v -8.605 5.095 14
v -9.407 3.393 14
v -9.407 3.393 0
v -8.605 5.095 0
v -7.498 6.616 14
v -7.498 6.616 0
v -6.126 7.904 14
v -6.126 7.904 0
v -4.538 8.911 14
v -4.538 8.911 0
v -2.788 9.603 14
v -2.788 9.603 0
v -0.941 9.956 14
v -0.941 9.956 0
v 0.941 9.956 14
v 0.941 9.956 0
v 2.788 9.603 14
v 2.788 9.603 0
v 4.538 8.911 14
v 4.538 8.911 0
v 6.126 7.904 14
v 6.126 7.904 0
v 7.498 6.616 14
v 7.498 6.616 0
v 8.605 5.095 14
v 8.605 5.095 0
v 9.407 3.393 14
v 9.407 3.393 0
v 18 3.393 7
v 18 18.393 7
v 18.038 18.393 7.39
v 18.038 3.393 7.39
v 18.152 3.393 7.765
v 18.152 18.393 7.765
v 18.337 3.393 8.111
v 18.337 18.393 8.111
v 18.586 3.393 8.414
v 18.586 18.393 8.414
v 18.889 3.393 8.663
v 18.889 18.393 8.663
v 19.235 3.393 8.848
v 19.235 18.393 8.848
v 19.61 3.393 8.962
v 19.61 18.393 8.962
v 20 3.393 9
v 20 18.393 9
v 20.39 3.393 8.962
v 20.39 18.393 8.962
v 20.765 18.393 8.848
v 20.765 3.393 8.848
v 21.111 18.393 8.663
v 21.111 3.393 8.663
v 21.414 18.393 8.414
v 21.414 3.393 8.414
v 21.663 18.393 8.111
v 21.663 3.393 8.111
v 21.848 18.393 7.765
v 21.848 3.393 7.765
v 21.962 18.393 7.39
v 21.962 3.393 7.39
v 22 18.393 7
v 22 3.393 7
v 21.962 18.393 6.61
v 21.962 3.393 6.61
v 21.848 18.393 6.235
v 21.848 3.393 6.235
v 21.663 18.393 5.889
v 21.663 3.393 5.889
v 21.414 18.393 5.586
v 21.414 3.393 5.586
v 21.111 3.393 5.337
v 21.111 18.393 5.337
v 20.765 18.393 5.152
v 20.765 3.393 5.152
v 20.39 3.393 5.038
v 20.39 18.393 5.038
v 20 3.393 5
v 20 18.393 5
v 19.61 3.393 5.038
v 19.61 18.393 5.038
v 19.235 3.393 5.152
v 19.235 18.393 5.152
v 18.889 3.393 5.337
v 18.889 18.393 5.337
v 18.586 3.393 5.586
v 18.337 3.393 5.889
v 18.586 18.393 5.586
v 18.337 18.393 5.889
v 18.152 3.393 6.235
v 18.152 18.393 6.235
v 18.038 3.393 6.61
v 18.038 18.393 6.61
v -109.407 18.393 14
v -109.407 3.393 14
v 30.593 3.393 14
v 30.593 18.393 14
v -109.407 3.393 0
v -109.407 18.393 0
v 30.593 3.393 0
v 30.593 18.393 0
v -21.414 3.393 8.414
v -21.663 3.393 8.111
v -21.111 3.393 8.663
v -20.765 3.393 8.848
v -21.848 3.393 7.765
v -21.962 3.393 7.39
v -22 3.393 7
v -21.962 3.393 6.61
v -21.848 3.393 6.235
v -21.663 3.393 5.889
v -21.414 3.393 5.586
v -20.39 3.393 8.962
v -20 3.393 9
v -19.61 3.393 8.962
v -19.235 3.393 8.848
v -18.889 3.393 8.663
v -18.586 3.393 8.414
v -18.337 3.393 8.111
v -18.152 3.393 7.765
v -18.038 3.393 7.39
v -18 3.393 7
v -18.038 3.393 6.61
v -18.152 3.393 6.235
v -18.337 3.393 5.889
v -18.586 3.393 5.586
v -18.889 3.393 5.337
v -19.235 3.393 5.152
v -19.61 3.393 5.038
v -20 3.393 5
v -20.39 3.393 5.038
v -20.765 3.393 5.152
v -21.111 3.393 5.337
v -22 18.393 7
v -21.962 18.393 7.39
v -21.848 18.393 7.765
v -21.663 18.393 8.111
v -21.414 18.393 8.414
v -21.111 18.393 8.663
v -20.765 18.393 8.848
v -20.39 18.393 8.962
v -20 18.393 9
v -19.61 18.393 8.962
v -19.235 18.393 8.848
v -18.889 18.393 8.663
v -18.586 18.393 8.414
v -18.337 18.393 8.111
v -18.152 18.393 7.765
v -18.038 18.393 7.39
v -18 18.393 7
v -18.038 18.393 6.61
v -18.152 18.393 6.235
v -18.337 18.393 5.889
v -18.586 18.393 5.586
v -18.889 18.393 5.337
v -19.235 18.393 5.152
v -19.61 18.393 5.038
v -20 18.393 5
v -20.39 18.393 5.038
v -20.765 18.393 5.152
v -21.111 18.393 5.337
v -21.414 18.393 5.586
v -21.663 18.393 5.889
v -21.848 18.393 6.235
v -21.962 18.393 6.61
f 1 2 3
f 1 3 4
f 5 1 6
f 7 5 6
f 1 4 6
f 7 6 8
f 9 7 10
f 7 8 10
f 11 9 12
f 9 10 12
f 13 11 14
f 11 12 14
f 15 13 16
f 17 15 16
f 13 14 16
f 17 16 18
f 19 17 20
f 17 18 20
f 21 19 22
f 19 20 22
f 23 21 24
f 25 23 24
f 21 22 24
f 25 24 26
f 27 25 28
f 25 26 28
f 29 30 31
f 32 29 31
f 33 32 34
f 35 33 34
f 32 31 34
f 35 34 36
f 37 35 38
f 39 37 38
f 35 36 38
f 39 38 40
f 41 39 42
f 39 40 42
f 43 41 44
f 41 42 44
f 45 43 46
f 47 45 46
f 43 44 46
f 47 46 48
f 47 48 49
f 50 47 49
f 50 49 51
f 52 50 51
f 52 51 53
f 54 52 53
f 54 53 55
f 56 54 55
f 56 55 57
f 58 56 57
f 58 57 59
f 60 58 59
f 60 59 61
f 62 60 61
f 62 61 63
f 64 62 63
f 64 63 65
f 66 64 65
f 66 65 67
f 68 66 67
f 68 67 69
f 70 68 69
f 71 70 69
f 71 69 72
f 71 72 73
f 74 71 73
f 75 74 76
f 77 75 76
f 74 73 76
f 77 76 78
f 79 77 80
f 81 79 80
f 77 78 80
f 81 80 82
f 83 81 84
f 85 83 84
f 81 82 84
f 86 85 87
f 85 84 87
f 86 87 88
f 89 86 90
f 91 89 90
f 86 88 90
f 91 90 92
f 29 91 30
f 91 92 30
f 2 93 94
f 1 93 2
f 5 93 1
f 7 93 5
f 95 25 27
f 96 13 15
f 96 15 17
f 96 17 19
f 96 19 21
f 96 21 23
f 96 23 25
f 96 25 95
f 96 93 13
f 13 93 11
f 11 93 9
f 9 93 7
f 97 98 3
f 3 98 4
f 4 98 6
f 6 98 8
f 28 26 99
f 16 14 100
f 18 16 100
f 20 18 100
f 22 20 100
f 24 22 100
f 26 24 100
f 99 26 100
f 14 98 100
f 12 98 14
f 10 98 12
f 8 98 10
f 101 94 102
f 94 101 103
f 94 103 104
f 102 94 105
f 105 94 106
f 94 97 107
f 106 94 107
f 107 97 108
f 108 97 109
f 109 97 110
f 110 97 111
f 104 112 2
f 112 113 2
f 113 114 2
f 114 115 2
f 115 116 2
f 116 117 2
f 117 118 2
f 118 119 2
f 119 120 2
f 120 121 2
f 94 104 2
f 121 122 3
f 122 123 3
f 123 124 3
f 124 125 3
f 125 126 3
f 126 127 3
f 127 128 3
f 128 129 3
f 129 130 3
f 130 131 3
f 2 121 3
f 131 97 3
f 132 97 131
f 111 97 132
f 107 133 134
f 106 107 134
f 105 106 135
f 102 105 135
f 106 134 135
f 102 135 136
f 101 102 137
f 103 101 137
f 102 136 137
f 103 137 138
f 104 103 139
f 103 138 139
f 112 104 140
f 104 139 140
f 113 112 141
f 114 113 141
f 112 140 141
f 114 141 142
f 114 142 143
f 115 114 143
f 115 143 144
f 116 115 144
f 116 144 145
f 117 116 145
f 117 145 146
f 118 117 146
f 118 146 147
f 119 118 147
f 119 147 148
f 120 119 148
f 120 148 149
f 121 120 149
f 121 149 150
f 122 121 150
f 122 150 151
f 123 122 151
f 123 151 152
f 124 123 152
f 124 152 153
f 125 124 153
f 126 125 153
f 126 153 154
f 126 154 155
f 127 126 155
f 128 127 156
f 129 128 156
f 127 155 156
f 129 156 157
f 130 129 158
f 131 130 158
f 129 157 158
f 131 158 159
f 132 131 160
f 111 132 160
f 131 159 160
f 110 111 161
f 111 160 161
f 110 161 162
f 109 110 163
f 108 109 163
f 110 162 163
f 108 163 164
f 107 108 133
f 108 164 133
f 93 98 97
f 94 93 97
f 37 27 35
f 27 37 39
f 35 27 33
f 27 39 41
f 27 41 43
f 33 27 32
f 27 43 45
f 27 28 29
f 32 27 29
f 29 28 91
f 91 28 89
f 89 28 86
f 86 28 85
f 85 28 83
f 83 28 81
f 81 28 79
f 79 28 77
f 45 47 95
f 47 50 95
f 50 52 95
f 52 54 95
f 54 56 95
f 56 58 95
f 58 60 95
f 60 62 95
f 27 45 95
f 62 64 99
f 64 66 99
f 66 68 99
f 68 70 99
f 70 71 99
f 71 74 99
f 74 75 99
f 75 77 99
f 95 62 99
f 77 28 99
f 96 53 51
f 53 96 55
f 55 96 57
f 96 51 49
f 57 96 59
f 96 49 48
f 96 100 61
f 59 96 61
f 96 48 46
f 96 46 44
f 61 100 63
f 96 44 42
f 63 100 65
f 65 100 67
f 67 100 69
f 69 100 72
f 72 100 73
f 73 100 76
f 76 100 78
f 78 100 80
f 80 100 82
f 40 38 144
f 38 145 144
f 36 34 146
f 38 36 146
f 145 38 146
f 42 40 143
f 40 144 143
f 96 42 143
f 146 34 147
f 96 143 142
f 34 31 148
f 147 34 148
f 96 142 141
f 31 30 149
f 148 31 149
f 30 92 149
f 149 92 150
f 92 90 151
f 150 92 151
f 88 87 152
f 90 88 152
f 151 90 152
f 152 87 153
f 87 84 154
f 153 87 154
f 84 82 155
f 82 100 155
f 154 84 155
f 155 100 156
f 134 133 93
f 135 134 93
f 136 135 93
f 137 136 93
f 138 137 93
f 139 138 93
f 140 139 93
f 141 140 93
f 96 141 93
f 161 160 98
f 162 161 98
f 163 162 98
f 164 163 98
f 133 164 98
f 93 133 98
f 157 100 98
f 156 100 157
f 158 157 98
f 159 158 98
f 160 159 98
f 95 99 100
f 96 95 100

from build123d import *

# Parameters (mm, degrees)
BOSS_EXTRUDE1_DEPTH = 14
CUT_EXTRUDE1_REACH  = 113.314
SKETCH4_R           = 2


with BuildPart() as part:
    # Sketch2 → Boss-Extrude1 (new body)
    with BuildSketch(Plane.XY):
        with BuildLine():
            Line((9.406636819, 3.393402975), (30.593363181, 3.393402975))
            Line((30.593363181, 3.393402975), (30.593363181, 18.393402975))
            Line((30.593363181, 18.393402975), (-109.406636819, 18.393402975))
            Line((-109.406636819, 18.393402975), (-109.406636819, 3.393402975))
            Line((-109.406636819, 3.393402975), (-9.406636819, 3.393402975))
            ThreePointArc((-9.406636819, 3.393402975), (0, 10), (9.406636819, 3.393402975))
        make_face()
    extrude(amount=BOSS_EXTRUDE1_DEPTH)

    # Sketch4 → Cut-Extrude1 (cut, up to next)
    with BuildSketch(Plane(origin=(0, 18.393402975, 0), x_dir=(1, 0, 0), z_dir=(0, 1, 0)), mode=Mode.PRIVATE) as cut_extrude1_sk1:
        with Locations(Location((20, -7, 0), (0, 0, 180))):
            Circle(SKETCH4_R)
    cut_extrude1_tool1 = extrude(cut_extrude1_sk1.sketch, amount=-CUT_EXTRUDE1_REACH, mode=Mode.PRIVATE) & part.part
    # Sketch4 → Cut-Extrude1 (cut, up to next)
    with BuildSketch(Plane(origin=(0, 18.393402975, 0), x_dir=(1, 0, 0), z_dir=(0, 1, 0)), mode=Mode.PRIVATE) as cut_extrude1_sk2:
        with Locations(Location((-20, -7, 0), (0, 0, 180))):
            Circle(SKETCH4_R)
    cut_extrude1_tool2 = extrude(cut_extrude1_sk2.sketch, amount=-CUT_EXTRUDE1_REACH, mode=Mode.PRIVATE) & part.part
    add(cut_extrude1_tool1.solids().sort_by_distance((20, 18.393403, 7))[0], mode=Mode.SUBTRACT)
    add(cut_extrude1_tool2.solids().sort_by_distance((-20, 18.393403, 7))[0], mode=Mode.SUBTRACT)


solid = part.part
